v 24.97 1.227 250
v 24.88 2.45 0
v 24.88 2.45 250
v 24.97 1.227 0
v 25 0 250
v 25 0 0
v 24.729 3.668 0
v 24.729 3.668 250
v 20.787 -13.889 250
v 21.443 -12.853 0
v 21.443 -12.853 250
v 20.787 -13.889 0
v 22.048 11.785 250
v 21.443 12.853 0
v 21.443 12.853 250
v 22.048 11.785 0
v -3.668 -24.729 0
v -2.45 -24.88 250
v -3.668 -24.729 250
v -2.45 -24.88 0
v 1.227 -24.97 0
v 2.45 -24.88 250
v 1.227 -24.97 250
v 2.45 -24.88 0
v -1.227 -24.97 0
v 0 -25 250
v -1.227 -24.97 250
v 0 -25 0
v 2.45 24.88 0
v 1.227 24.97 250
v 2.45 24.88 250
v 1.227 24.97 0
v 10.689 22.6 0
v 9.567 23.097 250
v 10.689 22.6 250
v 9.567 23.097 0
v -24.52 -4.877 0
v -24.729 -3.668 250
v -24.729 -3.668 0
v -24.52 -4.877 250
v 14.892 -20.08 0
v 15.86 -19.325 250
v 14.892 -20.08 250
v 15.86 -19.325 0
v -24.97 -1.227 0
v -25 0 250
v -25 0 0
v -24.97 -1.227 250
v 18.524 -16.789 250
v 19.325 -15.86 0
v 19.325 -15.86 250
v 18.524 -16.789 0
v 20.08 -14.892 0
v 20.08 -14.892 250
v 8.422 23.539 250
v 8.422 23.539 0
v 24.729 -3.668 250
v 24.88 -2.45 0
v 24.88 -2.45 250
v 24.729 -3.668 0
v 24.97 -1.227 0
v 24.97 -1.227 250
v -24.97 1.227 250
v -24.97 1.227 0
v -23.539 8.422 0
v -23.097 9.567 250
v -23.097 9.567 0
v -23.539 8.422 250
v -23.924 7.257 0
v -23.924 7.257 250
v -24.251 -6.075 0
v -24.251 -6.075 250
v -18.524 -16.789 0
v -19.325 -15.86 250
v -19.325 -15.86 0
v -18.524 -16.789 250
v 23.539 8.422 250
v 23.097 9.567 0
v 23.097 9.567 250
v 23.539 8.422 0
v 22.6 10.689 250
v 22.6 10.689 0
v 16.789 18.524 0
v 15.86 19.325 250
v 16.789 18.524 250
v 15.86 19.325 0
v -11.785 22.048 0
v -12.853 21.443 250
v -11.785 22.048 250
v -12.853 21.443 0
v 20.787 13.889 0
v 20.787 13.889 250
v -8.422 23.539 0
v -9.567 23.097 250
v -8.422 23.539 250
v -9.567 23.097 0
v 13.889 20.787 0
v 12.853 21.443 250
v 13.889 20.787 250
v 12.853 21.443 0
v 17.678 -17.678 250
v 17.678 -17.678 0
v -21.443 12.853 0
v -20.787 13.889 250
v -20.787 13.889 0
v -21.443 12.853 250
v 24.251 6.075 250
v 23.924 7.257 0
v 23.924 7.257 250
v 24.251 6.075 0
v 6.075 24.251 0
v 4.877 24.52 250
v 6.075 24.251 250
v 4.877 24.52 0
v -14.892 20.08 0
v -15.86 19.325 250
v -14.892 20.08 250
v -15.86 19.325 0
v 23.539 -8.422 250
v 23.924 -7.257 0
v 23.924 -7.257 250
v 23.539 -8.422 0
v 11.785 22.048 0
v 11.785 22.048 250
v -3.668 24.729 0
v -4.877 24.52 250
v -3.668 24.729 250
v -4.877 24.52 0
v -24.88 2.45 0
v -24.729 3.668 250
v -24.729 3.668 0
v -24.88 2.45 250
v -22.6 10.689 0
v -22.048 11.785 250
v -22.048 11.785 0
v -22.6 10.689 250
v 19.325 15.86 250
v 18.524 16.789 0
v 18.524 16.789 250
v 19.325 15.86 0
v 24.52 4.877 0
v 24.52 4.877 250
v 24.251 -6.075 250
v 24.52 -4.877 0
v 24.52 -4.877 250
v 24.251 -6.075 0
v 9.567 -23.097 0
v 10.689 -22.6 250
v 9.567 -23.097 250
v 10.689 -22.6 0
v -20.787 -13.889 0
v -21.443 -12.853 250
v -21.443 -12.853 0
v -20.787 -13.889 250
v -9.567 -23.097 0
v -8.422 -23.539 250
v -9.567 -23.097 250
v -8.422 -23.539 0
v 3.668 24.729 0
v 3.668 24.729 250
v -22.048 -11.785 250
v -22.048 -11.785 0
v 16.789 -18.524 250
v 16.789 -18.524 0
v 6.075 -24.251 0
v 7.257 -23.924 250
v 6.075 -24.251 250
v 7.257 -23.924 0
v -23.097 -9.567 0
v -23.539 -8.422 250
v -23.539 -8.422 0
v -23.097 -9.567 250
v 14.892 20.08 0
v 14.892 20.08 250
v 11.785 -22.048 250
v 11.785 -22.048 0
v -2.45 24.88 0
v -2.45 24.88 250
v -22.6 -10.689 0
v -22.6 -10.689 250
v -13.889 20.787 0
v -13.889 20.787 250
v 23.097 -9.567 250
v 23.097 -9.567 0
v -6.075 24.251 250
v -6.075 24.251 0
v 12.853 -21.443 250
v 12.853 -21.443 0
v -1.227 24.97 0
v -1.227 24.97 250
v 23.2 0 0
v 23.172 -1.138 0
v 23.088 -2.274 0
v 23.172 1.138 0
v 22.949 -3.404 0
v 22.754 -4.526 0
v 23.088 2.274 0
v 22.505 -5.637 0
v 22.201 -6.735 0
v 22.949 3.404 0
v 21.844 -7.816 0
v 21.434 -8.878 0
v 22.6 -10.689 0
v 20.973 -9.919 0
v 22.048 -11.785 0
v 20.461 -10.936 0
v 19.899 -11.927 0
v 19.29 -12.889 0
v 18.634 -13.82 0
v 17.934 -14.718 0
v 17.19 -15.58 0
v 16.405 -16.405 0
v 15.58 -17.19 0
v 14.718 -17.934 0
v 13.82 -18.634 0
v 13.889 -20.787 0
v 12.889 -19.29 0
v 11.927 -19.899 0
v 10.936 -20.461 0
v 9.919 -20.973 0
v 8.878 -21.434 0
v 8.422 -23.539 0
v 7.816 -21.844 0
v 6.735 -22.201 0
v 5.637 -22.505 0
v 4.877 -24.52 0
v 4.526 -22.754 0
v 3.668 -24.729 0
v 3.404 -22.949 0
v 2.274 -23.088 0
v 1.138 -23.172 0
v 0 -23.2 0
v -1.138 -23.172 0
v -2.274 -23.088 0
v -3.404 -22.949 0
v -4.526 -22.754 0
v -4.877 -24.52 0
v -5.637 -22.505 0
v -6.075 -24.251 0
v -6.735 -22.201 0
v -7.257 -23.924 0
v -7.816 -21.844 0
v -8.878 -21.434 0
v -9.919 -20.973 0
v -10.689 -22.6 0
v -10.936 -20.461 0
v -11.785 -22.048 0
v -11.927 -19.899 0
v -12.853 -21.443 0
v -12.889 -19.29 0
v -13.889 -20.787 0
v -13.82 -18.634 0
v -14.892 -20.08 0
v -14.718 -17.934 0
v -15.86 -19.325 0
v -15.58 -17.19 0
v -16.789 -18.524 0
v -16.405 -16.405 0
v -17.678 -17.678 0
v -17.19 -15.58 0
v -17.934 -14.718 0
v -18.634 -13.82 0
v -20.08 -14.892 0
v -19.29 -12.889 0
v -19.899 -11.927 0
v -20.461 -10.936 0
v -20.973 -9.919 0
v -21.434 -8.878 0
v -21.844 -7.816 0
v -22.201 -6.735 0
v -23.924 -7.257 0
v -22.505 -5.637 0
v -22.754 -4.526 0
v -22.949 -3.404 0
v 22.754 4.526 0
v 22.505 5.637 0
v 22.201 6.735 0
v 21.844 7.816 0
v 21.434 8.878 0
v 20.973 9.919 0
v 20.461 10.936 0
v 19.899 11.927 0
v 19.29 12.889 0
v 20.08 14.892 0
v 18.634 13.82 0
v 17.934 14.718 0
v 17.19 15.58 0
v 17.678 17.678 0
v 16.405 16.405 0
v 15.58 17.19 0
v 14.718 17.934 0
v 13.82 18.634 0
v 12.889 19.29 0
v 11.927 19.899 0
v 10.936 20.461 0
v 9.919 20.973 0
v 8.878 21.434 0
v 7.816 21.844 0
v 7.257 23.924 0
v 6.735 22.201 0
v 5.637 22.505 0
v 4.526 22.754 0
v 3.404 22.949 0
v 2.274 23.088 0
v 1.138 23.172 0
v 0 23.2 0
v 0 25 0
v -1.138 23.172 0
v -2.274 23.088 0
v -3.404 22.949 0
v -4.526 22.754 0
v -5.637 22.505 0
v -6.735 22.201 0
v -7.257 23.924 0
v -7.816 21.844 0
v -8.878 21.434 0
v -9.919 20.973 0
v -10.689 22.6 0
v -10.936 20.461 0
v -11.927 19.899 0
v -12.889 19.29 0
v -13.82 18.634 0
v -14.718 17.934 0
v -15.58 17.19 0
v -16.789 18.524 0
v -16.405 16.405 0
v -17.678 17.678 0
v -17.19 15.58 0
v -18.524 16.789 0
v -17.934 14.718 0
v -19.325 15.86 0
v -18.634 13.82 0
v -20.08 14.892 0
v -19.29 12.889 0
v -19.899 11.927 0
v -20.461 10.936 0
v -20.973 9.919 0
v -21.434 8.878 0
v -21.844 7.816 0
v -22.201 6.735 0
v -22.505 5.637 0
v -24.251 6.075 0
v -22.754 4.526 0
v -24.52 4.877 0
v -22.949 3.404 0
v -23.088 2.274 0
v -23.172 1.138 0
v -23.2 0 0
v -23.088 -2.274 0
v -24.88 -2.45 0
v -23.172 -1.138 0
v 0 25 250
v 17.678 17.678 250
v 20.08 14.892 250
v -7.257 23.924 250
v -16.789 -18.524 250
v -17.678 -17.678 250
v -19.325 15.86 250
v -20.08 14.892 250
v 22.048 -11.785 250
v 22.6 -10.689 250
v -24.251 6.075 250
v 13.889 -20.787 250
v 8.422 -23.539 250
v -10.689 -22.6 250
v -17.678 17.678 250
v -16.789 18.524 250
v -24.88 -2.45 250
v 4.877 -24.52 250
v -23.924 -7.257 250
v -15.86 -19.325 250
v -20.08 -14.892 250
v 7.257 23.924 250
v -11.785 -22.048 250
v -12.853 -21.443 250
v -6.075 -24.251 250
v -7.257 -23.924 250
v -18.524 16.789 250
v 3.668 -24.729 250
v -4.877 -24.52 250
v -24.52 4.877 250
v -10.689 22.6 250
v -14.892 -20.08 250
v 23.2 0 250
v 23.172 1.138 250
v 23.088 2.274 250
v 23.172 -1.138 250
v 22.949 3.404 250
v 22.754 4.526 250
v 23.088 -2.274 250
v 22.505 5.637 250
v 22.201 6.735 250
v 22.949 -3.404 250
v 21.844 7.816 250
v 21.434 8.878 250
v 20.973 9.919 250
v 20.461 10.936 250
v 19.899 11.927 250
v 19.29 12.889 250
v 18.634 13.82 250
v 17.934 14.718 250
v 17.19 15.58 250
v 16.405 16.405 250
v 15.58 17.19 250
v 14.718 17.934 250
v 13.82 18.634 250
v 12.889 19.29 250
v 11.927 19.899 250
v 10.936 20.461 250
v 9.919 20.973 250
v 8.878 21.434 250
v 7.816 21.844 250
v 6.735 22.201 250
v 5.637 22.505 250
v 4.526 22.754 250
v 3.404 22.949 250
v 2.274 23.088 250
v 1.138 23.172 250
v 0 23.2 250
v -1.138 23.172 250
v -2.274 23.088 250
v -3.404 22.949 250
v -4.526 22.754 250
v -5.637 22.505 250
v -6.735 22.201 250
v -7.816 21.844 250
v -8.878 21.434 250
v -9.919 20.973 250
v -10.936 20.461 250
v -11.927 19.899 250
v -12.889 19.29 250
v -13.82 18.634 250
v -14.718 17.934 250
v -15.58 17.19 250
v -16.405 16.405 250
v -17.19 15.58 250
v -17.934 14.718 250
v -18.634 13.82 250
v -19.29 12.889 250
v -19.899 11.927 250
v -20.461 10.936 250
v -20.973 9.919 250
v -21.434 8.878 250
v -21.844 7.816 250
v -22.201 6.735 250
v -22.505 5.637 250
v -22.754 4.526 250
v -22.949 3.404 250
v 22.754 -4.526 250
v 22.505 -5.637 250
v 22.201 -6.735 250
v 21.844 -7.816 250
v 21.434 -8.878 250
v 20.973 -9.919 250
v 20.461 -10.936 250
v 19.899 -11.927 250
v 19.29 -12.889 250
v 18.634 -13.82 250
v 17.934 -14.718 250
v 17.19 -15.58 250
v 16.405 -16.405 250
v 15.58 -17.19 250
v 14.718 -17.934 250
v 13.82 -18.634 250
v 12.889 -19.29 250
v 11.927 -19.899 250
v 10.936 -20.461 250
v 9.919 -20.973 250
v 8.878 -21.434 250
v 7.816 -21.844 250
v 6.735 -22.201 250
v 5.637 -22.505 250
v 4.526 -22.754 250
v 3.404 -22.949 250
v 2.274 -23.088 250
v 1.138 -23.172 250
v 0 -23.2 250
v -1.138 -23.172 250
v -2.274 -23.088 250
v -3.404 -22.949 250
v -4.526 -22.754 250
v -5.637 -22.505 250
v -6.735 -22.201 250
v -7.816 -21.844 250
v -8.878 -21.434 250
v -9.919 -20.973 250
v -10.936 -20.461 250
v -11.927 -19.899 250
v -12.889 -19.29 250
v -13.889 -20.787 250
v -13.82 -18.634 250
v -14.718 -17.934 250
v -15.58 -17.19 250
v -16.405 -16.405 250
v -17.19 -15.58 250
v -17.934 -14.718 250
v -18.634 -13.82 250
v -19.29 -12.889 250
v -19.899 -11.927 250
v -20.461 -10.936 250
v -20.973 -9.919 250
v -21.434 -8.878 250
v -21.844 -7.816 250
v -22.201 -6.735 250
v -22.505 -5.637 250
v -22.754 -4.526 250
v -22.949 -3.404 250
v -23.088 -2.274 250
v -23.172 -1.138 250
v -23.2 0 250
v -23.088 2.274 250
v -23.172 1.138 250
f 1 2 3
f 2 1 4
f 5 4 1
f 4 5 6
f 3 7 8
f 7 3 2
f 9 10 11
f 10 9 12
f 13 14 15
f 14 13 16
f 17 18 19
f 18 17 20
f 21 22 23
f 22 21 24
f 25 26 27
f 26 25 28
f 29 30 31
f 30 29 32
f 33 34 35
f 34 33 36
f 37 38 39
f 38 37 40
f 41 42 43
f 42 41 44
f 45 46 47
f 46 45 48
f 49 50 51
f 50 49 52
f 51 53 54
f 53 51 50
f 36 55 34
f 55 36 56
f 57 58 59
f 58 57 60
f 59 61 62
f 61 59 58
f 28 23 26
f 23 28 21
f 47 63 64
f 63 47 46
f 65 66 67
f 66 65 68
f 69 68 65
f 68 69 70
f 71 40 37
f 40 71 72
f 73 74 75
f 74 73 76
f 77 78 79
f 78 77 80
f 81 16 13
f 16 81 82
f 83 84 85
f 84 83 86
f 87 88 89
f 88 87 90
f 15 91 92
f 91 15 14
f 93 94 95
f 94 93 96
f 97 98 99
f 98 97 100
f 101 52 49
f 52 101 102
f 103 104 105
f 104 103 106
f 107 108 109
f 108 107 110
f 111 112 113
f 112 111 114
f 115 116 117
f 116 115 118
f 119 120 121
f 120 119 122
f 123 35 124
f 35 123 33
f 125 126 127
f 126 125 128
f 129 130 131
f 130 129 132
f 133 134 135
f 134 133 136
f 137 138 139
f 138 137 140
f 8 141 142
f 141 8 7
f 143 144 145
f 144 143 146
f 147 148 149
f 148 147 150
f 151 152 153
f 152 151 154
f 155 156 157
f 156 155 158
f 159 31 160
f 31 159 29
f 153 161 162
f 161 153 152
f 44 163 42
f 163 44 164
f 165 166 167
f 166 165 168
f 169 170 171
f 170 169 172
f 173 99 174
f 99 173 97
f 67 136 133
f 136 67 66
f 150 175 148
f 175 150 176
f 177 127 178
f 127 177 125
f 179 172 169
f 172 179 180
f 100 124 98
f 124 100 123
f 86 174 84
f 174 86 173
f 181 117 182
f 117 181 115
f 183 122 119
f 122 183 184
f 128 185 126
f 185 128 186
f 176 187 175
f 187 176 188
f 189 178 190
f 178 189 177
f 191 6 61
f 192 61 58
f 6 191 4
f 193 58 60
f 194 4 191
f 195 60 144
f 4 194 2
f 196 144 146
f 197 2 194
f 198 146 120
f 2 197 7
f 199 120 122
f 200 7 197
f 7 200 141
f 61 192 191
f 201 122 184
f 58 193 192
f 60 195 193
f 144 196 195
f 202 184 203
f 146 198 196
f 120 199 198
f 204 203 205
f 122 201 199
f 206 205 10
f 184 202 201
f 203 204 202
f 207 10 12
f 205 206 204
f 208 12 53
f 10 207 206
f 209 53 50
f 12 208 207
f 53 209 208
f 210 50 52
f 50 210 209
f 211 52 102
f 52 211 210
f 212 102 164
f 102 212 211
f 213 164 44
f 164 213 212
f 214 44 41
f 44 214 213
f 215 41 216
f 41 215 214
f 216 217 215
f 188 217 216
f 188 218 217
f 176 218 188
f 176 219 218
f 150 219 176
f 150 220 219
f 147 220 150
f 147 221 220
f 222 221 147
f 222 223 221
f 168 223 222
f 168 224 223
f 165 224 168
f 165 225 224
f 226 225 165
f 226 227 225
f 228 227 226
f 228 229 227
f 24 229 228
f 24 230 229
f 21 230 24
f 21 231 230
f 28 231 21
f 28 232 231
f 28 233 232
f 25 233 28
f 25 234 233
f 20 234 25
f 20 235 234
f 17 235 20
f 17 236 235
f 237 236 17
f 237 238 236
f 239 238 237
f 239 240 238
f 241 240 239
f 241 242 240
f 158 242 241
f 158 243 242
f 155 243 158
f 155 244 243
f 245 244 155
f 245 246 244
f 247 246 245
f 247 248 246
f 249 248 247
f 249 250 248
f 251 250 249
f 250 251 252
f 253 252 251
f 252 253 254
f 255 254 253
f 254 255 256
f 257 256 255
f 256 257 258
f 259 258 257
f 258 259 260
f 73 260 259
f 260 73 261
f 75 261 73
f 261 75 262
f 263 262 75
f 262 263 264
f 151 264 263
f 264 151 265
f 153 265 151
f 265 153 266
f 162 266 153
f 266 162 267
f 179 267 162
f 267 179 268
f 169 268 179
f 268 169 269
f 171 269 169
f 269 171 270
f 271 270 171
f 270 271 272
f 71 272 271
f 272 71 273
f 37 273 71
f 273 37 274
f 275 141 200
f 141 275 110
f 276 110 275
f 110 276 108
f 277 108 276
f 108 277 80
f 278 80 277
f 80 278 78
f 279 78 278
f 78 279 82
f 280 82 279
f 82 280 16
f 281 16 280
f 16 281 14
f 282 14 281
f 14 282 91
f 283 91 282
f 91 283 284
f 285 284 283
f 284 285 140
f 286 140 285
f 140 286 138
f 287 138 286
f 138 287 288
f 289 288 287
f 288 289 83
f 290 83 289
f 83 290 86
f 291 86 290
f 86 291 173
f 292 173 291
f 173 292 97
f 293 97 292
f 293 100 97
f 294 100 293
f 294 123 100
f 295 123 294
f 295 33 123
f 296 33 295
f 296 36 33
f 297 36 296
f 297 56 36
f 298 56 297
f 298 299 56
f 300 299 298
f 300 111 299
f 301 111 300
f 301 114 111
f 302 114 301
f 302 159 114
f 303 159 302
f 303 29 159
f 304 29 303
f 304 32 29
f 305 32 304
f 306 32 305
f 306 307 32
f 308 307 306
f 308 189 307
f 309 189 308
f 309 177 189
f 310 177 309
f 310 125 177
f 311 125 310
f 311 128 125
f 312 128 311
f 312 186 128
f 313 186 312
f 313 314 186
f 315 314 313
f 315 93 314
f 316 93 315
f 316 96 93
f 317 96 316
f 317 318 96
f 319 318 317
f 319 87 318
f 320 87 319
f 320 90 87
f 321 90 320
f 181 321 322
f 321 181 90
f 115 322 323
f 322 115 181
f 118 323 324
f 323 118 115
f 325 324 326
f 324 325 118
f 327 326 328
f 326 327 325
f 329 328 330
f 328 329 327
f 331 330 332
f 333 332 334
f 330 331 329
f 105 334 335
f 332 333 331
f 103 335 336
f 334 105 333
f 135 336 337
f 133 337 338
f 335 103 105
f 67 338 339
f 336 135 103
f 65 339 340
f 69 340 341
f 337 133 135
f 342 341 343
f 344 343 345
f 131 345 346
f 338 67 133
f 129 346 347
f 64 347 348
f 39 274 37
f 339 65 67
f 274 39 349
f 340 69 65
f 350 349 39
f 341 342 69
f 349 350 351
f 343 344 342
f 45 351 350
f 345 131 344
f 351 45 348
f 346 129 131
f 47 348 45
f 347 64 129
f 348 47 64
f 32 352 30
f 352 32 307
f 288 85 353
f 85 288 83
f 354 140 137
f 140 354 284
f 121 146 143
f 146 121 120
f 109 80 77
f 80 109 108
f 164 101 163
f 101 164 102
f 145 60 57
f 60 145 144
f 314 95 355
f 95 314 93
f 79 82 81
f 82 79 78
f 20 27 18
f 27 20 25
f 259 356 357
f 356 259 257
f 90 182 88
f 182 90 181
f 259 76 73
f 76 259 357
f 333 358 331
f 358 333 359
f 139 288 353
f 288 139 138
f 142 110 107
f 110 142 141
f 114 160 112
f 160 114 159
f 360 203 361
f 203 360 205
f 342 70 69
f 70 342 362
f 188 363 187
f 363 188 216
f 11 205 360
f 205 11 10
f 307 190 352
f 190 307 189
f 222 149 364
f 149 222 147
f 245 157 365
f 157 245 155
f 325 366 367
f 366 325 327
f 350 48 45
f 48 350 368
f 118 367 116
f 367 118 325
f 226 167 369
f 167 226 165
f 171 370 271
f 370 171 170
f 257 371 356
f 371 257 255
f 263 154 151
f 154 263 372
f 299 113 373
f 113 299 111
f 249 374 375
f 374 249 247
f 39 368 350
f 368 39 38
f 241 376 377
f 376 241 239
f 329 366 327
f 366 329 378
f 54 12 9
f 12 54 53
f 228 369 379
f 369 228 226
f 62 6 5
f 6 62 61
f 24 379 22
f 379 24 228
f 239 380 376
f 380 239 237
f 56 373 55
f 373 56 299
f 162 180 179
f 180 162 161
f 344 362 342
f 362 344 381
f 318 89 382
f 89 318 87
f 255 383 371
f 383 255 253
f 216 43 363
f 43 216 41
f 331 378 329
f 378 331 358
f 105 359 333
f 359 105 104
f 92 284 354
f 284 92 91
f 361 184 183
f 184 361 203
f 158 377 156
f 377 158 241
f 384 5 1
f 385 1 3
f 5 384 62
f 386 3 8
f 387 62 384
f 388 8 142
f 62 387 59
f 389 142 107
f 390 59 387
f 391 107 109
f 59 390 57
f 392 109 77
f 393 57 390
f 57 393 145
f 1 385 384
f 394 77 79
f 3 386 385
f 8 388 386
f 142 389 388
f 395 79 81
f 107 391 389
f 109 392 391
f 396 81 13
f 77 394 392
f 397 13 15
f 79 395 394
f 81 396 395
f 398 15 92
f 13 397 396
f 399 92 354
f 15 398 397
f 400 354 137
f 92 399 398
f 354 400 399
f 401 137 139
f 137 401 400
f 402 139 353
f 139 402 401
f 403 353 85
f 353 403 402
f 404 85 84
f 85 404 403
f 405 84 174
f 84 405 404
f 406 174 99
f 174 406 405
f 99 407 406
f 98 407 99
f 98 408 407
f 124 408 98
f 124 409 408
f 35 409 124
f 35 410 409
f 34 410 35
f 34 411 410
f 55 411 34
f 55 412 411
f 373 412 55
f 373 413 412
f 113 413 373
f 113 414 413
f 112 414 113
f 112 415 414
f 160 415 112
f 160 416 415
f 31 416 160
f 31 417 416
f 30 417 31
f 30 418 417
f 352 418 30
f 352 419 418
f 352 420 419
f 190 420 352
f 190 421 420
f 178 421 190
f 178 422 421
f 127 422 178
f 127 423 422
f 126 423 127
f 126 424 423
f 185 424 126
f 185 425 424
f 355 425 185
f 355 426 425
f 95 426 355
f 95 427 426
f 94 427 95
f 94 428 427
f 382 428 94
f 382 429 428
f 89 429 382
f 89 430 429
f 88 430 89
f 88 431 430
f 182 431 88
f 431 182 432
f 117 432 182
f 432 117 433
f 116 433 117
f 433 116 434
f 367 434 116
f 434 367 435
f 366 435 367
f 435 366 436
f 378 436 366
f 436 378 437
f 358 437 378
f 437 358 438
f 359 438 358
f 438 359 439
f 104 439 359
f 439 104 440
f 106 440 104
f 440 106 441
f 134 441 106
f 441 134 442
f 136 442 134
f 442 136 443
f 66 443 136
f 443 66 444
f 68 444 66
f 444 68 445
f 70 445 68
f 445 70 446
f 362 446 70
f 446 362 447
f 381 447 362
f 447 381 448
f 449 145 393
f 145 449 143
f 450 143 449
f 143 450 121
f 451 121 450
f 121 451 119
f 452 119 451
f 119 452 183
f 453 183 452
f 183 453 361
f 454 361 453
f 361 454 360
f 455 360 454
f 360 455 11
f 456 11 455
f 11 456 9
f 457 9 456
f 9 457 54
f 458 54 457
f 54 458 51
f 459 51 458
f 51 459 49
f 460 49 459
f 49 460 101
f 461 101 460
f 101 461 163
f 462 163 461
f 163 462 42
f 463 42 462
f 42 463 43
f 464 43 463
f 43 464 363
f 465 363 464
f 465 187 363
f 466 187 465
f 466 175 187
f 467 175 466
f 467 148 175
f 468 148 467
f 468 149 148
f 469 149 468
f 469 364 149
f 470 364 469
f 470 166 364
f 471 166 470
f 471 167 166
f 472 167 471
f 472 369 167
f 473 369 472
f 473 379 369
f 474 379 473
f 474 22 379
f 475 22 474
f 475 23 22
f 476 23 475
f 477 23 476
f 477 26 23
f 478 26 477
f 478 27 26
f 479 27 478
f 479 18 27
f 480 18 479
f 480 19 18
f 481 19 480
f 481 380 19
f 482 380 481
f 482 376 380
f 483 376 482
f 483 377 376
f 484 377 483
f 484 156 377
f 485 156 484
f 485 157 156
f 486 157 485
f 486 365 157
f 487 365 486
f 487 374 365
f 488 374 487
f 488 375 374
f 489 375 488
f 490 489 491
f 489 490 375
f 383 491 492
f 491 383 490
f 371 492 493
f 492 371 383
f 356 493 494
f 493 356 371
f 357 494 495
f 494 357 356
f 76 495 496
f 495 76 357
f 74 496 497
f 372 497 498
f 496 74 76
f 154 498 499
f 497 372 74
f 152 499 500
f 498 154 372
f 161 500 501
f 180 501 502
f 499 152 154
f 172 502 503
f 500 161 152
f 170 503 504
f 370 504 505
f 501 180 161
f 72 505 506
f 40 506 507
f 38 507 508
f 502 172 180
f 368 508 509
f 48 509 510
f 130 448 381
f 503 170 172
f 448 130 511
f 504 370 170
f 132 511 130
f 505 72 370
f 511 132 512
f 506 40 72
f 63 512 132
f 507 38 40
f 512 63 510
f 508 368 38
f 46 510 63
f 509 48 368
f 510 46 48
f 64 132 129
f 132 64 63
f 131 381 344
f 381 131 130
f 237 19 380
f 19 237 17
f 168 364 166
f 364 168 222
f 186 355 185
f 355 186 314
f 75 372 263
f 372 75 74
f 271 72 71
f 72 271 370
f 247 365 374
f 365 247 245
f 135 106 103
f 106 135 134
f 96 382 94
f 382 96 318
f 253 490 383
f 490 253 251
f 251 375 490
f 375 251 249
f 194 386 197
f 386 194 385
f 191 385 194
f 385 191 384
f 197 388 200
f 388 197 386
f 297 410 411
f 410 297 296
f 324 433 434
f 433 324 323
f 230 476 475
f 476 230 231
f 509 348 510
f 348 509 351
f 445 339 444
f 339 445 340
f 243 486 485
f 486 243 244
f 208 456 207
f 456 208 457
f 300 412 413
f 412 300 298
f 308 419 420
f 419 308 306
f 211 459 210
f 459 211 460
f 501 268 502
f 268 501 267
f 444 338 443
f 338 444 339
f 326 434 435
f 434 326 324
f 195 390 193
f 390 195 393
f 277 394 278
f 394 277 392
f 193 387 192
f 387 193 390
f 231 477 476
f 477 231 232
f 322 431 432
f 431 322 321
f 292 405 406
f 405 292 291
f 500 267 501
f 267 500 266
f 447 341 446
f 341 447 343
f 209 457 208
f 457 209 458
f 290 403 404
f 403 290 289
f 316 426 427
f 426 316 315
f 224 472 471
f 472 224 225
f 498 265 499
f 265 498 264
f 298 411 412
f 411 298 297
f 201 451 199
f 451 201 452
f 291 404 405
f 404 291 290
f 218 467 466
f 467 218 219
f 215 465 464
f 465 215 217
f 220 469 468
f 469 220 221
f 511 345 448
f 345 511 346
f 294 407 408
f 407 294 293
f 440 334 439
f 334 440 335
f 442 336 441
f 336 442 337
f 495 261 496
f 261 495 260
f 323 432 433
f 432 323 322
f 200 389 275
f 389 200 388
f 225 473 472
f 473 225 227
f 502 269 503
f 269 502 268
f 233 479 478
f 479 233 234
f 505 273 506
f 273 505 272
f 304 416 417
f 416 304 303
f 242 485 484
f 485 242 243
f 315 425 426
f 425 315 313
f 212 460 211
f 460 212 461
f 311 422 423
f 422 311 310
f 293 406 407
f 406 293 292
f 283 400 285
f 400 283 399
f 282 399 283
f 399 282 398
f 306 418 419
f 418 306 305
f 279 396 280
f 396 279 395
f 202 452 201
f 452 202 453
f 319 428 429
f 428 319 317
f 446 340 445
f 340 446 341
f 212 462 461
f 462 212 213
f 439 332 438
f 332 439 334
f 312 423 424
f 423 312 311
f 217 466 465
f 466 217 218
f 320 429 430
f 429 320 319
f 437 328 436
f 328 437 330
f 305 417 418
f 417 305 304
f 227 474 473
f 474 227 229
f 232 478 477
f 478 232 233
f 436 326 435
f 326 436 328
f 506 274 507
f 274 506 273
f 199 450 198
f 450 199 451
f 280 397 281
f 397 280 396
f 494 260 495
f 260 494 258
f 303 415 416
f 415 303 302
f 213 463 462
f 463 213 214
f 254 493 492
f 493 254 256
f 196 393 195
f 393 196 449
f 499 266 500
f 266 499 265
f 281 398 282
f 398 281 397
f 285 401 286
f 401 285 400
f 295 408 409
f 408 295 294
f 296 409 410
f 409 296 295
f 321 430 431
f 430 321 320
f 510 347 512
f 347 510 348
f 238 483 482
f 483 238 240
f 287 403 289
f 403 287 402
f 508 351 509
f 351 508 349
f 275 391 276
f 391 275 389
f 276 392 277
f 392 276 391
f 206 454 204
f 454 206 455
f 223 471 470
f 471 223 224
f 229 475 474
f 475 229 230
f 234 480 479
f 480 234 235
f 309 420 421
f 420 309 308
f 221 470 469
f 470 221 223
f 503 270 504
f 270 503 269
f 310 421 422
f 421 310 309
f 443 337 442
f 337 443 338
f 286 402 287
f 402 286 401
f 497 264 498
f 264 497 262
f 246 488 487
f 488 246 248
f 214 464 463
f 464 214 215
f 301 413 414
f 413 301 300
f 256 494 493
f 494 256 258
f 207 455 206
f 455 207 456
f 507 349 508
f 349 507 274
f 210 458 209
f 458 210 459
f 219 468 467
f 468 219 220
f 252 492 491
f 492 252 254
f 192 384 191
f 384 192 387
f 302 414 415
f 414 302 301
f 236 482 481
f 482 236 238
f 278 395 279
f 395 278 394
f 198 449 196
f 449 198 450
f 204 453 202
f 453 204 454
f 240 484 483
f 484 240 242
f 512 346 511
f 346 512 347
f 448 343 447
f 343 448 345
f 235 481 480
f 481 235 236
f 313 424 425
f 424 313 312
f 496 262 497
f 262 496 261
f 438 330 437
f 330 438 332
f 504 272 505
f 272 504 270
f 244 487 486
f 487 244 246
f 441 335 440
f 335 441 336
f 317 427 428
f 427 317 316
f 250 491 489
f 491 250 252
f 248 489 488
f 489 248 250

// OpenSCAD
$fn = 128;

// HT 50 pipe (approx.): DN 50, length 250 mm
// Typical HT dimensions (approx):
// - Outer diameter: 50 mm
// - Wall thickness: 1.8 mm  -> inner diameter: 46.4 mm
// Adjust if you need exact manufacturer dimensions.

length = 250;
od = 50;
wall = 1.8;
id = od - 2*wall;

module ht_pipe(L=250, OD=50, ID=46.4) {
    difference() {
        cylinder(h=L, d=OD);
        translate([0,0,-0.1]) cylinder(h=L+0.2, d=ID);
    }
}

ht_pipe(length, od, id);
